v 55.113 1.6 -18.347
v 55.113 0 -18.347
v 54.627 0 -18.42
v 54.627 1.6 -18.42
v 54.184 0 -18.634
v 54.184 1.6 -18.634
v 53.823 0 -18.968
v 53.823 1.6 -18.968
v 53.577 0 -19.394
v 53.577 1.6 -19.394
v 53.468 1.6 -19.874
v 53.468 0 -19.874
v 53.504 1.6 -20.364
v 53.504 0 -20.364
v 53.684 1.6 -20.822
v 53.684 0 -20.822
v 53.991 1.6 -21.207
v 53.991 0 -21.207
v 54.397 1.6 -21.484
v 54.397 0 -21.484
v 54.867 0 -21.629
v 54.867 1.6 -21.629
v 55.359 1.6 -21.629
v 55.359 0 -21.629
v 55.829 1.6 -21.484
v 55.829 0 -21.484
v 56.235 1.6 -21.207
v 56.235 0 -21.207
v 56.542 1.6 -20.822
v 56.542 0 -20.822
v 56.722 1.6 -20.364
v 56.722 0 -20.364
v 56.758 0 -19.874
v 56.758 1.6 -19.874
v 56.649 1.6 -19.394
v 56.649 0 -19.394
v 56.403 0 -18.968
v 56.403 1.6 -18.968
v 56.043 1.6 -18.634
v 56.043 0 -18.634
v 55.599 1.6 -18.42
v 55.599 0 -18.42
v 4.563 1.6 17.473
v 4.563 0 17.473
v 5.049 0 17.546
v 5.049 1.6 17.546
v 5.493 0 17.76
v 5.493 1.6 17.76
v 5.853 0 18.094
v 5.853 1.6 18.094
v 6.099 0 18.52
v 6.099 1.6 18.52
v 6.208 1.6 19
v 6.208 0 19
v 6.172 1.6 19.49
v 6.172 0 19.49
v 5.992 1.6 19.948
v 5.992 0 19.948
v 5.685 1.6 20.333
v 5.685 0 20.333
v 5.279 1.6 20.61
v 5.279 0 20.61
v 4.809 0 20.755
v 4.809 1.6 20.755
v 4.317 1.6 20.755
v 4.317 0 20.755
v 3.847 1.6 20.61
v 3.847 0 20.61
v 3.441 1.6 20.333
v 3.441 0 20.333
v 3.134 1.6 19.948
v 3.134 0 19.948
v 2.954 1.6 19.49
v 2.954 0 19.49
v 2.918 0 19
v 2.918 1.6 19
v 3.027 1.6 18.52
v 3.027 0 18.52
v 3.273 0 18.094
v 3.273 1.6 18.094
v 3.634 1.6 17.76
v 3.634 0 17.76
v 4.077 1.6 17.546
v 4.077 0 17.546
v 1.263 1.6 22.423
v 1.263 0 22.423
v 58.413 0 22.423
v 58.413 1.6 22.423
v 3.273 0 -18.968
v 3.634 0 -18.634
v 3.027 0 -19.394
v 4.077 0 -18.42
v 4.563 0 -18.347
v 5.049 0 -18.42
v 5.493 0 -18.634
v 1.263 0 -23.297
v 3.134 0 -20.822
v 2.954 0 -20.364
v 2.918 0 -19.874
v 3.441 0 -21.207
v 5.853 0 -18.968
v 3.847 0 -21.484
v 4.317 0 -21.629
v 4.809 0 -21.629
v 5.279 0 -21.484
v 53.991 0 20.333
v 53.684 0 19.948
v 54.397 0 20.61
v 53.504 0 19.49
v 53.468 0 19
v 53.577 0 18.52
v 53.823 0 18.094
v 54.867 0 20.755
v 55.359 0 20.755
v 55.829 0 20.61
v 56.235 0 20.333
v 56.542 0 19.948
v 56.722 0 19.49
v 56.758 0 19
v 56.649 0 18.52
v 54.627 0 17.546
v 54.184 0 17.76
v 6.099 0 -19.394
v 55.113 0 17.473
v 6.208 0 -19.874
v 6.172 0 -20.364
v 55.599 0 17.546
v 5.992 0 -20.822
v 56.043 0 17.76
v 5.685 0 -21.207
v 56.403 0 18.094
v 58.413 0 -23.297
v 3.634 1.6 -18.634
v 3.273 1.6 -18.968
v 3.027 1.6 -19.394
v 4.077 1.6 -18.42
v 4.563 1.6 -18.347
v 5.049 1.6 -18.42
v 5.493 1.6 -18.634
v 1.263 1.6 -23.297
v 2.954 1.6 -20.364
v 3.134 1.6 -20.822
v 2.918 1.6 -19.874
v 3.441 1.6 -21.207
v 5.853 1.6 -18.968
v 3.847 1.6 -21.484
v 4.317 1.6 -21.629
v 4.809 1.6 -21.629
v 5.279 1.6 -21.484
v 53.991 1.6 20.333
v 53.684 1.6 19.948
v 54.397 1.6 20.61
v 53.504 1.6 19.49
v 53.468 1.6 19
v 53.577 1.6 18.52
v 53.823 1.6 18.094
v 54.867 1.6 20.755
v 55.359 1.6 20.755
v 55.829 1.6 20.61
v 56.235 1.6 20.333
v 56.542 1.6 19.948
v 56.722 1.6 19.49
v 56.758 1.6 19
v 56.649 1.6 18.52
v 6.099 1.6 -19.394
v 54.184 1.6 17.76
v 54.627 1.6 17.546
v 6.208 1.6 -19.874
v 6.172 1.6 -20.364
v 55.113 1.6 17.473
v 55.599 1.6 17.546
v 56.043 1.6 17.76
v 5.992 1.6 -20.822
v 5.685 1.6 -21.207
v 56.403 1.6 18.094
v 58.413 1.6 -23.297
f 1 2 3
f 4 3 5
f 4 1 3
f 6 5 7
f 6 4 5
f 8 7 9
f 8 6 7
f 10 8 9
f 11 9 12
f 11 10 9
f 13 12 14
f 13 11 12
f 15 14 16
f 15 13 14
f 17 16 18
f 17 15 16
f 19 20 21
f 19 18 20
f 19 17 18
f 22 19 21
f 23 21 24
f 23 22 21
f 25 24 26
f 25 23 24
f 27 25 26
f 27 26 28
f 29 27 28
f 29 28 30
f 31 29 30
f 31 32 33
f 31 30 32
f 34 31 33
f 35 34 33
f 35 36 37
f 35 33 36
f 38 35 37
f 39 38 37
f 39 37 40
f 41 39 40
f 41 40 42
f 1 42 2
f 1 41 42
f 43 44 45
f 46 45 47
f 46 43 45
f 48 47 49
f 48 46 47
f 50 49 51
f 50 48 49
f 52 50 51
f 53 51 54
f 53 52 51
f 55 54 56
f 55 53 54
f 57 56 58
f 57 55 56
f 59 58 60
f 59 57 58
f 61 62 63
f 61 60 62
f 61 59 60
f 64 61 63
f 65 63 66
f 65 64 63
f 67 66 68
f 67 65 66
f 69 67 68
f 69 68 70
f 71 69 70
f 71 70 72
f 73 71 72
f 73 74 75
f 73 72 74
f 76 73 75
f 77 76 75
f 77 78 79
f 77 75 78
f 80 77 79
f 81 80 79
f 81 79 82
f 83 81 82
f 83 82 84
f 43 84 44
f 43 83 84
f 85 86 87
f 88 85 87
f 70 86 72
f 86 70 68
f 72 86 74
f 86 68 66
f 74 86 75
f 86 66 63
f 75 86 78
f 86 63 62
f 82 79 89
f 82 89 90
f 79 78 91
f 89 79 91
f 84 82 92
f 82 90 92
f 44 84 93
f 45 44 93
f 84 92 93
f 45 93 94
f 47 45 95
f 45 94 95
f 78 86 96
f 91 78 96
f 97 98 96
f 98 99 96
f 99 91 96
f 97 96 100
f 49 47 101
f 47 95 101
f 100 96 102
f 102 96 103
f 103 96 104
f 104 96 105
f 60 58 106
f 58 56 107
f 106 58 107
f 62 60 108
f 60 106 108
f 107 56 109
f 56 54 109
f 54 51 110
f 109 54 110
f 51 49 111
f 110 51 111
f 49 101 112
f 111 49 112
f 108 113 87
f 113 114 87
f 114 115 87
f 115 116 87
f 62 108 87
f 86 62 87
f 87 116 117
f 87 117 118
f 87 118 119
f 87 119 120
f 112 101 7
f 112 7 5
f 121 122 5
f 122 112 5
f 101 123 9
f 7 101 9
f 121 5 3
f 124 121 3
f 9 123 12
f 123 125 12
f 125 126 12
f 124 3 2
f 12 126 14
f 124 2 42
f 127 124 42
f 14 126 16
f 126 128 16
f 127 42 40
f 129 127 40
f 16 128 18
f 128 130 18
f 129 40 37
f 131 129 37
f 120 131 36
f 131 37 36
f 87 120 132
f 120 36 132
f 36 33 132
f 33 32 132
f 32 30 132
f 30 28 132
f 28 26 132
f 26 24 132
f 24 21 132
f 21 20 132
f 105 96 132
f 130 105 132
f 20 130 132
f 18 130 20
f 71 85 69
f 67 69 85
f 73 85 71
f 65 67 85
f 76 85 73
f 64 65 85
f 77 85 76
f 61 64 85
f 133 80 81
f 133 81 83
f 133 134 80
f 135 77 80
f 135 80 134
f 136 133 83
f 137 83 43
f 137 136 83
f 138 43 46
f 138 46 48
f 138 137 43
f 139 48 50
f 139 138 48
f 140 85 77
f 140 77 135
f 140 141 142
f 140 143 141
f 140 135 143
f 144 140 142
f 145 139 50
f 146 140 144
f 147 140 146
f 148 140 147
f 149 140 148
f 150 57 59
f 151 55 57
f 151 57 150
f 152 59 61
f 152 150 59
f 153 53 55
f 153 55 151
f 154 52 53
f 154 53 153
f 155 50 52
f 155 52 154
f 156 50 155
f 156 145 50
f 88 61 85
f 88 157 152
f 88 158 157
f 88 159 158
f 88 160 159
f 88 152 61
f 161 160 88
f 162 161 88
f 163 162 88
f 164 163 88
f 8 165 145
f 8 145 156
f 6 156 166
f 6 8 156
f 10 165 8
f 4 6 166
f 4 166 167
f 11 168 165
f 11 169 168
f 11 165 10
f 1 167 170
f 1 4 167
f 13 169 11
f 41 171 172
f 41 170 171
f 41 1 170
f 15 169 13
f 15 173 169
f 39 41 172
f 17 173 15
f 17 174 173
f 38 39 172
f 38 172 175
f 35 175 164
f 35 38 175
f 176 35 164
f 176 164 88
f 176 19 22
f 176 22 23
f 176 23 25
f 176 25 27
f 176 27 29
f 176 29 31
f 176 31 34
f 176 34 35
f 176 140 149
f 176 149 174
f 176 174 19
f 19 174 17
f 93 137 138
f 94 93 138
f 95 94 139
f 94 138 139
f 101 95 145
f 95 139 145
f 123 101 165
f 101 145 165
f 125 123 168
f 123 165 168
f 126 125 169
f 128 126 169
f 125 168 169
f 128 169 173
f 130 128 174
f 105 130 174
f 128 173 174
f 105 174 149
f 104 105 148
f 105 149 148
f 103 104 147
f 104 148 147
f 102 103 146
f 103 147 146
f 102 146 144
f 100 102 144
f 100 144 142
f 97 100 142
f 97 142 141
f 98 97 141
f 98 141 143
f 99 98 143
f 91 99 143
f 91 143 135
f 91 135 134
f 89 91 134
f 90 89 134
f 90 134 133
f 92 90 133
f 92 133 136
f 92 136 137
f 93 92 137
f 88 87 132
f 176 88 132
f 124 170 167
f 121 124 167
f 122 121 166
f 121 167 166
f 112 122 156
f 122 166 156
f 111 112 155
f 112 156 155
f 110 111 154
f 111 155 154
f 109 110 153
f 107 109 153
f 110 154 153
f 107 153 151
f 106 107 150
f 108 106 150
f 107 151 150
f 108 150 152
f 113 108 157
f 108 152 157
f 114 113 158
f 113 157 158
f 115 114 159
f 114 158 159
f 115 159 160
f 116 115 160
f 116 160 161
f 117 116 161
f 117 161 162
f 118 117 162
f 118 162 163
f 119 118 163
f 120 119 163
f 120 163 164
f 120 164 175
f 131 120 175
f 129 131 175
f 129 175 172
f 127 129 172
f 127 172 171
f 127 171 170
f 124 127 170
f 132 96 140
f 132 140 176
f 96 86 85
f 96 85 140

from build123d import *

# Parameters (mm, degrees)
SKETCH1_W               = 57.15
SKETCH1_H               = 45.72
BOSS_EXTRUDE1_DEPTH     = 1.600000102
SKETCH2_R               = 1.65
CUT_EXTRUDE1_DEPTH      = 63.907866186
MIRROR3_COPY_1_SKETCH_R = 1.65
MIRROR3_COPY_1_DEPTH    = 63.907866186


with BuildPart() as part:
    # Sketch1 → Boss-Extrude1 (new body)
    with BuildSketch(Plane(origin=(0, 0, 0), x_dir=(1, 0, 0), z_dir=(0, 1, 0))):
        with Locations((29.838090662, 0.437005539)):
            Rectangle(SKETCH1_W, SKETCH1_H)
    extrude(amount=BOSS_EXTRUDE1_DEPTH)

    # Sketch2 → Cut-Extrude1 (cut, through all)
    with BuildSketch(Plane(origin=(0, 1.600000102, 0), x_dir=(1, 0, 0), z_dir=(0, 1, 0))):
        with Locations(Location((4.563090662, 19.997005539, 0), (0, 0, 270))):
            Circle(SKETCH2_R)
    cut_extrude1 = extrude(amount=-CUT_EXTRUDE1_DEPTH, mode=Mode.SUBTRACT)

    # Mirror1: Cut-Extrude1 across plane
    add(cut_extrude1.mirror(Plane.XY.offset(-0.437005539)), mode=Mode.SUBTRACT)

    # Mirror3: Cut-Extrude1 across plane
    add(cut_extrude1.mirror(Plane.ZY.offset(-29.838090662)), mode=Mode.SUBTRACT)

    # Mirror3 copy 1 sketch → Mirror3 copy 1 (cut, through all)
    with BuildSketch(Plane(origin=(59.676181324, 1.600000102, -0.874011079), x_dir=(-1, 0, 0), z_dir=(0, 1, 0))):
        with Locations(Location((4.563090662, 19.997005539, 0), (0, 0, 270))):
            Circle(MIRROR3_COPY_1_SKETCH_R)
    extrude(amount=-MIRROR3_COPY_1_DEPTH, mode=Mode.SUBTRACT)


solid = part.part
